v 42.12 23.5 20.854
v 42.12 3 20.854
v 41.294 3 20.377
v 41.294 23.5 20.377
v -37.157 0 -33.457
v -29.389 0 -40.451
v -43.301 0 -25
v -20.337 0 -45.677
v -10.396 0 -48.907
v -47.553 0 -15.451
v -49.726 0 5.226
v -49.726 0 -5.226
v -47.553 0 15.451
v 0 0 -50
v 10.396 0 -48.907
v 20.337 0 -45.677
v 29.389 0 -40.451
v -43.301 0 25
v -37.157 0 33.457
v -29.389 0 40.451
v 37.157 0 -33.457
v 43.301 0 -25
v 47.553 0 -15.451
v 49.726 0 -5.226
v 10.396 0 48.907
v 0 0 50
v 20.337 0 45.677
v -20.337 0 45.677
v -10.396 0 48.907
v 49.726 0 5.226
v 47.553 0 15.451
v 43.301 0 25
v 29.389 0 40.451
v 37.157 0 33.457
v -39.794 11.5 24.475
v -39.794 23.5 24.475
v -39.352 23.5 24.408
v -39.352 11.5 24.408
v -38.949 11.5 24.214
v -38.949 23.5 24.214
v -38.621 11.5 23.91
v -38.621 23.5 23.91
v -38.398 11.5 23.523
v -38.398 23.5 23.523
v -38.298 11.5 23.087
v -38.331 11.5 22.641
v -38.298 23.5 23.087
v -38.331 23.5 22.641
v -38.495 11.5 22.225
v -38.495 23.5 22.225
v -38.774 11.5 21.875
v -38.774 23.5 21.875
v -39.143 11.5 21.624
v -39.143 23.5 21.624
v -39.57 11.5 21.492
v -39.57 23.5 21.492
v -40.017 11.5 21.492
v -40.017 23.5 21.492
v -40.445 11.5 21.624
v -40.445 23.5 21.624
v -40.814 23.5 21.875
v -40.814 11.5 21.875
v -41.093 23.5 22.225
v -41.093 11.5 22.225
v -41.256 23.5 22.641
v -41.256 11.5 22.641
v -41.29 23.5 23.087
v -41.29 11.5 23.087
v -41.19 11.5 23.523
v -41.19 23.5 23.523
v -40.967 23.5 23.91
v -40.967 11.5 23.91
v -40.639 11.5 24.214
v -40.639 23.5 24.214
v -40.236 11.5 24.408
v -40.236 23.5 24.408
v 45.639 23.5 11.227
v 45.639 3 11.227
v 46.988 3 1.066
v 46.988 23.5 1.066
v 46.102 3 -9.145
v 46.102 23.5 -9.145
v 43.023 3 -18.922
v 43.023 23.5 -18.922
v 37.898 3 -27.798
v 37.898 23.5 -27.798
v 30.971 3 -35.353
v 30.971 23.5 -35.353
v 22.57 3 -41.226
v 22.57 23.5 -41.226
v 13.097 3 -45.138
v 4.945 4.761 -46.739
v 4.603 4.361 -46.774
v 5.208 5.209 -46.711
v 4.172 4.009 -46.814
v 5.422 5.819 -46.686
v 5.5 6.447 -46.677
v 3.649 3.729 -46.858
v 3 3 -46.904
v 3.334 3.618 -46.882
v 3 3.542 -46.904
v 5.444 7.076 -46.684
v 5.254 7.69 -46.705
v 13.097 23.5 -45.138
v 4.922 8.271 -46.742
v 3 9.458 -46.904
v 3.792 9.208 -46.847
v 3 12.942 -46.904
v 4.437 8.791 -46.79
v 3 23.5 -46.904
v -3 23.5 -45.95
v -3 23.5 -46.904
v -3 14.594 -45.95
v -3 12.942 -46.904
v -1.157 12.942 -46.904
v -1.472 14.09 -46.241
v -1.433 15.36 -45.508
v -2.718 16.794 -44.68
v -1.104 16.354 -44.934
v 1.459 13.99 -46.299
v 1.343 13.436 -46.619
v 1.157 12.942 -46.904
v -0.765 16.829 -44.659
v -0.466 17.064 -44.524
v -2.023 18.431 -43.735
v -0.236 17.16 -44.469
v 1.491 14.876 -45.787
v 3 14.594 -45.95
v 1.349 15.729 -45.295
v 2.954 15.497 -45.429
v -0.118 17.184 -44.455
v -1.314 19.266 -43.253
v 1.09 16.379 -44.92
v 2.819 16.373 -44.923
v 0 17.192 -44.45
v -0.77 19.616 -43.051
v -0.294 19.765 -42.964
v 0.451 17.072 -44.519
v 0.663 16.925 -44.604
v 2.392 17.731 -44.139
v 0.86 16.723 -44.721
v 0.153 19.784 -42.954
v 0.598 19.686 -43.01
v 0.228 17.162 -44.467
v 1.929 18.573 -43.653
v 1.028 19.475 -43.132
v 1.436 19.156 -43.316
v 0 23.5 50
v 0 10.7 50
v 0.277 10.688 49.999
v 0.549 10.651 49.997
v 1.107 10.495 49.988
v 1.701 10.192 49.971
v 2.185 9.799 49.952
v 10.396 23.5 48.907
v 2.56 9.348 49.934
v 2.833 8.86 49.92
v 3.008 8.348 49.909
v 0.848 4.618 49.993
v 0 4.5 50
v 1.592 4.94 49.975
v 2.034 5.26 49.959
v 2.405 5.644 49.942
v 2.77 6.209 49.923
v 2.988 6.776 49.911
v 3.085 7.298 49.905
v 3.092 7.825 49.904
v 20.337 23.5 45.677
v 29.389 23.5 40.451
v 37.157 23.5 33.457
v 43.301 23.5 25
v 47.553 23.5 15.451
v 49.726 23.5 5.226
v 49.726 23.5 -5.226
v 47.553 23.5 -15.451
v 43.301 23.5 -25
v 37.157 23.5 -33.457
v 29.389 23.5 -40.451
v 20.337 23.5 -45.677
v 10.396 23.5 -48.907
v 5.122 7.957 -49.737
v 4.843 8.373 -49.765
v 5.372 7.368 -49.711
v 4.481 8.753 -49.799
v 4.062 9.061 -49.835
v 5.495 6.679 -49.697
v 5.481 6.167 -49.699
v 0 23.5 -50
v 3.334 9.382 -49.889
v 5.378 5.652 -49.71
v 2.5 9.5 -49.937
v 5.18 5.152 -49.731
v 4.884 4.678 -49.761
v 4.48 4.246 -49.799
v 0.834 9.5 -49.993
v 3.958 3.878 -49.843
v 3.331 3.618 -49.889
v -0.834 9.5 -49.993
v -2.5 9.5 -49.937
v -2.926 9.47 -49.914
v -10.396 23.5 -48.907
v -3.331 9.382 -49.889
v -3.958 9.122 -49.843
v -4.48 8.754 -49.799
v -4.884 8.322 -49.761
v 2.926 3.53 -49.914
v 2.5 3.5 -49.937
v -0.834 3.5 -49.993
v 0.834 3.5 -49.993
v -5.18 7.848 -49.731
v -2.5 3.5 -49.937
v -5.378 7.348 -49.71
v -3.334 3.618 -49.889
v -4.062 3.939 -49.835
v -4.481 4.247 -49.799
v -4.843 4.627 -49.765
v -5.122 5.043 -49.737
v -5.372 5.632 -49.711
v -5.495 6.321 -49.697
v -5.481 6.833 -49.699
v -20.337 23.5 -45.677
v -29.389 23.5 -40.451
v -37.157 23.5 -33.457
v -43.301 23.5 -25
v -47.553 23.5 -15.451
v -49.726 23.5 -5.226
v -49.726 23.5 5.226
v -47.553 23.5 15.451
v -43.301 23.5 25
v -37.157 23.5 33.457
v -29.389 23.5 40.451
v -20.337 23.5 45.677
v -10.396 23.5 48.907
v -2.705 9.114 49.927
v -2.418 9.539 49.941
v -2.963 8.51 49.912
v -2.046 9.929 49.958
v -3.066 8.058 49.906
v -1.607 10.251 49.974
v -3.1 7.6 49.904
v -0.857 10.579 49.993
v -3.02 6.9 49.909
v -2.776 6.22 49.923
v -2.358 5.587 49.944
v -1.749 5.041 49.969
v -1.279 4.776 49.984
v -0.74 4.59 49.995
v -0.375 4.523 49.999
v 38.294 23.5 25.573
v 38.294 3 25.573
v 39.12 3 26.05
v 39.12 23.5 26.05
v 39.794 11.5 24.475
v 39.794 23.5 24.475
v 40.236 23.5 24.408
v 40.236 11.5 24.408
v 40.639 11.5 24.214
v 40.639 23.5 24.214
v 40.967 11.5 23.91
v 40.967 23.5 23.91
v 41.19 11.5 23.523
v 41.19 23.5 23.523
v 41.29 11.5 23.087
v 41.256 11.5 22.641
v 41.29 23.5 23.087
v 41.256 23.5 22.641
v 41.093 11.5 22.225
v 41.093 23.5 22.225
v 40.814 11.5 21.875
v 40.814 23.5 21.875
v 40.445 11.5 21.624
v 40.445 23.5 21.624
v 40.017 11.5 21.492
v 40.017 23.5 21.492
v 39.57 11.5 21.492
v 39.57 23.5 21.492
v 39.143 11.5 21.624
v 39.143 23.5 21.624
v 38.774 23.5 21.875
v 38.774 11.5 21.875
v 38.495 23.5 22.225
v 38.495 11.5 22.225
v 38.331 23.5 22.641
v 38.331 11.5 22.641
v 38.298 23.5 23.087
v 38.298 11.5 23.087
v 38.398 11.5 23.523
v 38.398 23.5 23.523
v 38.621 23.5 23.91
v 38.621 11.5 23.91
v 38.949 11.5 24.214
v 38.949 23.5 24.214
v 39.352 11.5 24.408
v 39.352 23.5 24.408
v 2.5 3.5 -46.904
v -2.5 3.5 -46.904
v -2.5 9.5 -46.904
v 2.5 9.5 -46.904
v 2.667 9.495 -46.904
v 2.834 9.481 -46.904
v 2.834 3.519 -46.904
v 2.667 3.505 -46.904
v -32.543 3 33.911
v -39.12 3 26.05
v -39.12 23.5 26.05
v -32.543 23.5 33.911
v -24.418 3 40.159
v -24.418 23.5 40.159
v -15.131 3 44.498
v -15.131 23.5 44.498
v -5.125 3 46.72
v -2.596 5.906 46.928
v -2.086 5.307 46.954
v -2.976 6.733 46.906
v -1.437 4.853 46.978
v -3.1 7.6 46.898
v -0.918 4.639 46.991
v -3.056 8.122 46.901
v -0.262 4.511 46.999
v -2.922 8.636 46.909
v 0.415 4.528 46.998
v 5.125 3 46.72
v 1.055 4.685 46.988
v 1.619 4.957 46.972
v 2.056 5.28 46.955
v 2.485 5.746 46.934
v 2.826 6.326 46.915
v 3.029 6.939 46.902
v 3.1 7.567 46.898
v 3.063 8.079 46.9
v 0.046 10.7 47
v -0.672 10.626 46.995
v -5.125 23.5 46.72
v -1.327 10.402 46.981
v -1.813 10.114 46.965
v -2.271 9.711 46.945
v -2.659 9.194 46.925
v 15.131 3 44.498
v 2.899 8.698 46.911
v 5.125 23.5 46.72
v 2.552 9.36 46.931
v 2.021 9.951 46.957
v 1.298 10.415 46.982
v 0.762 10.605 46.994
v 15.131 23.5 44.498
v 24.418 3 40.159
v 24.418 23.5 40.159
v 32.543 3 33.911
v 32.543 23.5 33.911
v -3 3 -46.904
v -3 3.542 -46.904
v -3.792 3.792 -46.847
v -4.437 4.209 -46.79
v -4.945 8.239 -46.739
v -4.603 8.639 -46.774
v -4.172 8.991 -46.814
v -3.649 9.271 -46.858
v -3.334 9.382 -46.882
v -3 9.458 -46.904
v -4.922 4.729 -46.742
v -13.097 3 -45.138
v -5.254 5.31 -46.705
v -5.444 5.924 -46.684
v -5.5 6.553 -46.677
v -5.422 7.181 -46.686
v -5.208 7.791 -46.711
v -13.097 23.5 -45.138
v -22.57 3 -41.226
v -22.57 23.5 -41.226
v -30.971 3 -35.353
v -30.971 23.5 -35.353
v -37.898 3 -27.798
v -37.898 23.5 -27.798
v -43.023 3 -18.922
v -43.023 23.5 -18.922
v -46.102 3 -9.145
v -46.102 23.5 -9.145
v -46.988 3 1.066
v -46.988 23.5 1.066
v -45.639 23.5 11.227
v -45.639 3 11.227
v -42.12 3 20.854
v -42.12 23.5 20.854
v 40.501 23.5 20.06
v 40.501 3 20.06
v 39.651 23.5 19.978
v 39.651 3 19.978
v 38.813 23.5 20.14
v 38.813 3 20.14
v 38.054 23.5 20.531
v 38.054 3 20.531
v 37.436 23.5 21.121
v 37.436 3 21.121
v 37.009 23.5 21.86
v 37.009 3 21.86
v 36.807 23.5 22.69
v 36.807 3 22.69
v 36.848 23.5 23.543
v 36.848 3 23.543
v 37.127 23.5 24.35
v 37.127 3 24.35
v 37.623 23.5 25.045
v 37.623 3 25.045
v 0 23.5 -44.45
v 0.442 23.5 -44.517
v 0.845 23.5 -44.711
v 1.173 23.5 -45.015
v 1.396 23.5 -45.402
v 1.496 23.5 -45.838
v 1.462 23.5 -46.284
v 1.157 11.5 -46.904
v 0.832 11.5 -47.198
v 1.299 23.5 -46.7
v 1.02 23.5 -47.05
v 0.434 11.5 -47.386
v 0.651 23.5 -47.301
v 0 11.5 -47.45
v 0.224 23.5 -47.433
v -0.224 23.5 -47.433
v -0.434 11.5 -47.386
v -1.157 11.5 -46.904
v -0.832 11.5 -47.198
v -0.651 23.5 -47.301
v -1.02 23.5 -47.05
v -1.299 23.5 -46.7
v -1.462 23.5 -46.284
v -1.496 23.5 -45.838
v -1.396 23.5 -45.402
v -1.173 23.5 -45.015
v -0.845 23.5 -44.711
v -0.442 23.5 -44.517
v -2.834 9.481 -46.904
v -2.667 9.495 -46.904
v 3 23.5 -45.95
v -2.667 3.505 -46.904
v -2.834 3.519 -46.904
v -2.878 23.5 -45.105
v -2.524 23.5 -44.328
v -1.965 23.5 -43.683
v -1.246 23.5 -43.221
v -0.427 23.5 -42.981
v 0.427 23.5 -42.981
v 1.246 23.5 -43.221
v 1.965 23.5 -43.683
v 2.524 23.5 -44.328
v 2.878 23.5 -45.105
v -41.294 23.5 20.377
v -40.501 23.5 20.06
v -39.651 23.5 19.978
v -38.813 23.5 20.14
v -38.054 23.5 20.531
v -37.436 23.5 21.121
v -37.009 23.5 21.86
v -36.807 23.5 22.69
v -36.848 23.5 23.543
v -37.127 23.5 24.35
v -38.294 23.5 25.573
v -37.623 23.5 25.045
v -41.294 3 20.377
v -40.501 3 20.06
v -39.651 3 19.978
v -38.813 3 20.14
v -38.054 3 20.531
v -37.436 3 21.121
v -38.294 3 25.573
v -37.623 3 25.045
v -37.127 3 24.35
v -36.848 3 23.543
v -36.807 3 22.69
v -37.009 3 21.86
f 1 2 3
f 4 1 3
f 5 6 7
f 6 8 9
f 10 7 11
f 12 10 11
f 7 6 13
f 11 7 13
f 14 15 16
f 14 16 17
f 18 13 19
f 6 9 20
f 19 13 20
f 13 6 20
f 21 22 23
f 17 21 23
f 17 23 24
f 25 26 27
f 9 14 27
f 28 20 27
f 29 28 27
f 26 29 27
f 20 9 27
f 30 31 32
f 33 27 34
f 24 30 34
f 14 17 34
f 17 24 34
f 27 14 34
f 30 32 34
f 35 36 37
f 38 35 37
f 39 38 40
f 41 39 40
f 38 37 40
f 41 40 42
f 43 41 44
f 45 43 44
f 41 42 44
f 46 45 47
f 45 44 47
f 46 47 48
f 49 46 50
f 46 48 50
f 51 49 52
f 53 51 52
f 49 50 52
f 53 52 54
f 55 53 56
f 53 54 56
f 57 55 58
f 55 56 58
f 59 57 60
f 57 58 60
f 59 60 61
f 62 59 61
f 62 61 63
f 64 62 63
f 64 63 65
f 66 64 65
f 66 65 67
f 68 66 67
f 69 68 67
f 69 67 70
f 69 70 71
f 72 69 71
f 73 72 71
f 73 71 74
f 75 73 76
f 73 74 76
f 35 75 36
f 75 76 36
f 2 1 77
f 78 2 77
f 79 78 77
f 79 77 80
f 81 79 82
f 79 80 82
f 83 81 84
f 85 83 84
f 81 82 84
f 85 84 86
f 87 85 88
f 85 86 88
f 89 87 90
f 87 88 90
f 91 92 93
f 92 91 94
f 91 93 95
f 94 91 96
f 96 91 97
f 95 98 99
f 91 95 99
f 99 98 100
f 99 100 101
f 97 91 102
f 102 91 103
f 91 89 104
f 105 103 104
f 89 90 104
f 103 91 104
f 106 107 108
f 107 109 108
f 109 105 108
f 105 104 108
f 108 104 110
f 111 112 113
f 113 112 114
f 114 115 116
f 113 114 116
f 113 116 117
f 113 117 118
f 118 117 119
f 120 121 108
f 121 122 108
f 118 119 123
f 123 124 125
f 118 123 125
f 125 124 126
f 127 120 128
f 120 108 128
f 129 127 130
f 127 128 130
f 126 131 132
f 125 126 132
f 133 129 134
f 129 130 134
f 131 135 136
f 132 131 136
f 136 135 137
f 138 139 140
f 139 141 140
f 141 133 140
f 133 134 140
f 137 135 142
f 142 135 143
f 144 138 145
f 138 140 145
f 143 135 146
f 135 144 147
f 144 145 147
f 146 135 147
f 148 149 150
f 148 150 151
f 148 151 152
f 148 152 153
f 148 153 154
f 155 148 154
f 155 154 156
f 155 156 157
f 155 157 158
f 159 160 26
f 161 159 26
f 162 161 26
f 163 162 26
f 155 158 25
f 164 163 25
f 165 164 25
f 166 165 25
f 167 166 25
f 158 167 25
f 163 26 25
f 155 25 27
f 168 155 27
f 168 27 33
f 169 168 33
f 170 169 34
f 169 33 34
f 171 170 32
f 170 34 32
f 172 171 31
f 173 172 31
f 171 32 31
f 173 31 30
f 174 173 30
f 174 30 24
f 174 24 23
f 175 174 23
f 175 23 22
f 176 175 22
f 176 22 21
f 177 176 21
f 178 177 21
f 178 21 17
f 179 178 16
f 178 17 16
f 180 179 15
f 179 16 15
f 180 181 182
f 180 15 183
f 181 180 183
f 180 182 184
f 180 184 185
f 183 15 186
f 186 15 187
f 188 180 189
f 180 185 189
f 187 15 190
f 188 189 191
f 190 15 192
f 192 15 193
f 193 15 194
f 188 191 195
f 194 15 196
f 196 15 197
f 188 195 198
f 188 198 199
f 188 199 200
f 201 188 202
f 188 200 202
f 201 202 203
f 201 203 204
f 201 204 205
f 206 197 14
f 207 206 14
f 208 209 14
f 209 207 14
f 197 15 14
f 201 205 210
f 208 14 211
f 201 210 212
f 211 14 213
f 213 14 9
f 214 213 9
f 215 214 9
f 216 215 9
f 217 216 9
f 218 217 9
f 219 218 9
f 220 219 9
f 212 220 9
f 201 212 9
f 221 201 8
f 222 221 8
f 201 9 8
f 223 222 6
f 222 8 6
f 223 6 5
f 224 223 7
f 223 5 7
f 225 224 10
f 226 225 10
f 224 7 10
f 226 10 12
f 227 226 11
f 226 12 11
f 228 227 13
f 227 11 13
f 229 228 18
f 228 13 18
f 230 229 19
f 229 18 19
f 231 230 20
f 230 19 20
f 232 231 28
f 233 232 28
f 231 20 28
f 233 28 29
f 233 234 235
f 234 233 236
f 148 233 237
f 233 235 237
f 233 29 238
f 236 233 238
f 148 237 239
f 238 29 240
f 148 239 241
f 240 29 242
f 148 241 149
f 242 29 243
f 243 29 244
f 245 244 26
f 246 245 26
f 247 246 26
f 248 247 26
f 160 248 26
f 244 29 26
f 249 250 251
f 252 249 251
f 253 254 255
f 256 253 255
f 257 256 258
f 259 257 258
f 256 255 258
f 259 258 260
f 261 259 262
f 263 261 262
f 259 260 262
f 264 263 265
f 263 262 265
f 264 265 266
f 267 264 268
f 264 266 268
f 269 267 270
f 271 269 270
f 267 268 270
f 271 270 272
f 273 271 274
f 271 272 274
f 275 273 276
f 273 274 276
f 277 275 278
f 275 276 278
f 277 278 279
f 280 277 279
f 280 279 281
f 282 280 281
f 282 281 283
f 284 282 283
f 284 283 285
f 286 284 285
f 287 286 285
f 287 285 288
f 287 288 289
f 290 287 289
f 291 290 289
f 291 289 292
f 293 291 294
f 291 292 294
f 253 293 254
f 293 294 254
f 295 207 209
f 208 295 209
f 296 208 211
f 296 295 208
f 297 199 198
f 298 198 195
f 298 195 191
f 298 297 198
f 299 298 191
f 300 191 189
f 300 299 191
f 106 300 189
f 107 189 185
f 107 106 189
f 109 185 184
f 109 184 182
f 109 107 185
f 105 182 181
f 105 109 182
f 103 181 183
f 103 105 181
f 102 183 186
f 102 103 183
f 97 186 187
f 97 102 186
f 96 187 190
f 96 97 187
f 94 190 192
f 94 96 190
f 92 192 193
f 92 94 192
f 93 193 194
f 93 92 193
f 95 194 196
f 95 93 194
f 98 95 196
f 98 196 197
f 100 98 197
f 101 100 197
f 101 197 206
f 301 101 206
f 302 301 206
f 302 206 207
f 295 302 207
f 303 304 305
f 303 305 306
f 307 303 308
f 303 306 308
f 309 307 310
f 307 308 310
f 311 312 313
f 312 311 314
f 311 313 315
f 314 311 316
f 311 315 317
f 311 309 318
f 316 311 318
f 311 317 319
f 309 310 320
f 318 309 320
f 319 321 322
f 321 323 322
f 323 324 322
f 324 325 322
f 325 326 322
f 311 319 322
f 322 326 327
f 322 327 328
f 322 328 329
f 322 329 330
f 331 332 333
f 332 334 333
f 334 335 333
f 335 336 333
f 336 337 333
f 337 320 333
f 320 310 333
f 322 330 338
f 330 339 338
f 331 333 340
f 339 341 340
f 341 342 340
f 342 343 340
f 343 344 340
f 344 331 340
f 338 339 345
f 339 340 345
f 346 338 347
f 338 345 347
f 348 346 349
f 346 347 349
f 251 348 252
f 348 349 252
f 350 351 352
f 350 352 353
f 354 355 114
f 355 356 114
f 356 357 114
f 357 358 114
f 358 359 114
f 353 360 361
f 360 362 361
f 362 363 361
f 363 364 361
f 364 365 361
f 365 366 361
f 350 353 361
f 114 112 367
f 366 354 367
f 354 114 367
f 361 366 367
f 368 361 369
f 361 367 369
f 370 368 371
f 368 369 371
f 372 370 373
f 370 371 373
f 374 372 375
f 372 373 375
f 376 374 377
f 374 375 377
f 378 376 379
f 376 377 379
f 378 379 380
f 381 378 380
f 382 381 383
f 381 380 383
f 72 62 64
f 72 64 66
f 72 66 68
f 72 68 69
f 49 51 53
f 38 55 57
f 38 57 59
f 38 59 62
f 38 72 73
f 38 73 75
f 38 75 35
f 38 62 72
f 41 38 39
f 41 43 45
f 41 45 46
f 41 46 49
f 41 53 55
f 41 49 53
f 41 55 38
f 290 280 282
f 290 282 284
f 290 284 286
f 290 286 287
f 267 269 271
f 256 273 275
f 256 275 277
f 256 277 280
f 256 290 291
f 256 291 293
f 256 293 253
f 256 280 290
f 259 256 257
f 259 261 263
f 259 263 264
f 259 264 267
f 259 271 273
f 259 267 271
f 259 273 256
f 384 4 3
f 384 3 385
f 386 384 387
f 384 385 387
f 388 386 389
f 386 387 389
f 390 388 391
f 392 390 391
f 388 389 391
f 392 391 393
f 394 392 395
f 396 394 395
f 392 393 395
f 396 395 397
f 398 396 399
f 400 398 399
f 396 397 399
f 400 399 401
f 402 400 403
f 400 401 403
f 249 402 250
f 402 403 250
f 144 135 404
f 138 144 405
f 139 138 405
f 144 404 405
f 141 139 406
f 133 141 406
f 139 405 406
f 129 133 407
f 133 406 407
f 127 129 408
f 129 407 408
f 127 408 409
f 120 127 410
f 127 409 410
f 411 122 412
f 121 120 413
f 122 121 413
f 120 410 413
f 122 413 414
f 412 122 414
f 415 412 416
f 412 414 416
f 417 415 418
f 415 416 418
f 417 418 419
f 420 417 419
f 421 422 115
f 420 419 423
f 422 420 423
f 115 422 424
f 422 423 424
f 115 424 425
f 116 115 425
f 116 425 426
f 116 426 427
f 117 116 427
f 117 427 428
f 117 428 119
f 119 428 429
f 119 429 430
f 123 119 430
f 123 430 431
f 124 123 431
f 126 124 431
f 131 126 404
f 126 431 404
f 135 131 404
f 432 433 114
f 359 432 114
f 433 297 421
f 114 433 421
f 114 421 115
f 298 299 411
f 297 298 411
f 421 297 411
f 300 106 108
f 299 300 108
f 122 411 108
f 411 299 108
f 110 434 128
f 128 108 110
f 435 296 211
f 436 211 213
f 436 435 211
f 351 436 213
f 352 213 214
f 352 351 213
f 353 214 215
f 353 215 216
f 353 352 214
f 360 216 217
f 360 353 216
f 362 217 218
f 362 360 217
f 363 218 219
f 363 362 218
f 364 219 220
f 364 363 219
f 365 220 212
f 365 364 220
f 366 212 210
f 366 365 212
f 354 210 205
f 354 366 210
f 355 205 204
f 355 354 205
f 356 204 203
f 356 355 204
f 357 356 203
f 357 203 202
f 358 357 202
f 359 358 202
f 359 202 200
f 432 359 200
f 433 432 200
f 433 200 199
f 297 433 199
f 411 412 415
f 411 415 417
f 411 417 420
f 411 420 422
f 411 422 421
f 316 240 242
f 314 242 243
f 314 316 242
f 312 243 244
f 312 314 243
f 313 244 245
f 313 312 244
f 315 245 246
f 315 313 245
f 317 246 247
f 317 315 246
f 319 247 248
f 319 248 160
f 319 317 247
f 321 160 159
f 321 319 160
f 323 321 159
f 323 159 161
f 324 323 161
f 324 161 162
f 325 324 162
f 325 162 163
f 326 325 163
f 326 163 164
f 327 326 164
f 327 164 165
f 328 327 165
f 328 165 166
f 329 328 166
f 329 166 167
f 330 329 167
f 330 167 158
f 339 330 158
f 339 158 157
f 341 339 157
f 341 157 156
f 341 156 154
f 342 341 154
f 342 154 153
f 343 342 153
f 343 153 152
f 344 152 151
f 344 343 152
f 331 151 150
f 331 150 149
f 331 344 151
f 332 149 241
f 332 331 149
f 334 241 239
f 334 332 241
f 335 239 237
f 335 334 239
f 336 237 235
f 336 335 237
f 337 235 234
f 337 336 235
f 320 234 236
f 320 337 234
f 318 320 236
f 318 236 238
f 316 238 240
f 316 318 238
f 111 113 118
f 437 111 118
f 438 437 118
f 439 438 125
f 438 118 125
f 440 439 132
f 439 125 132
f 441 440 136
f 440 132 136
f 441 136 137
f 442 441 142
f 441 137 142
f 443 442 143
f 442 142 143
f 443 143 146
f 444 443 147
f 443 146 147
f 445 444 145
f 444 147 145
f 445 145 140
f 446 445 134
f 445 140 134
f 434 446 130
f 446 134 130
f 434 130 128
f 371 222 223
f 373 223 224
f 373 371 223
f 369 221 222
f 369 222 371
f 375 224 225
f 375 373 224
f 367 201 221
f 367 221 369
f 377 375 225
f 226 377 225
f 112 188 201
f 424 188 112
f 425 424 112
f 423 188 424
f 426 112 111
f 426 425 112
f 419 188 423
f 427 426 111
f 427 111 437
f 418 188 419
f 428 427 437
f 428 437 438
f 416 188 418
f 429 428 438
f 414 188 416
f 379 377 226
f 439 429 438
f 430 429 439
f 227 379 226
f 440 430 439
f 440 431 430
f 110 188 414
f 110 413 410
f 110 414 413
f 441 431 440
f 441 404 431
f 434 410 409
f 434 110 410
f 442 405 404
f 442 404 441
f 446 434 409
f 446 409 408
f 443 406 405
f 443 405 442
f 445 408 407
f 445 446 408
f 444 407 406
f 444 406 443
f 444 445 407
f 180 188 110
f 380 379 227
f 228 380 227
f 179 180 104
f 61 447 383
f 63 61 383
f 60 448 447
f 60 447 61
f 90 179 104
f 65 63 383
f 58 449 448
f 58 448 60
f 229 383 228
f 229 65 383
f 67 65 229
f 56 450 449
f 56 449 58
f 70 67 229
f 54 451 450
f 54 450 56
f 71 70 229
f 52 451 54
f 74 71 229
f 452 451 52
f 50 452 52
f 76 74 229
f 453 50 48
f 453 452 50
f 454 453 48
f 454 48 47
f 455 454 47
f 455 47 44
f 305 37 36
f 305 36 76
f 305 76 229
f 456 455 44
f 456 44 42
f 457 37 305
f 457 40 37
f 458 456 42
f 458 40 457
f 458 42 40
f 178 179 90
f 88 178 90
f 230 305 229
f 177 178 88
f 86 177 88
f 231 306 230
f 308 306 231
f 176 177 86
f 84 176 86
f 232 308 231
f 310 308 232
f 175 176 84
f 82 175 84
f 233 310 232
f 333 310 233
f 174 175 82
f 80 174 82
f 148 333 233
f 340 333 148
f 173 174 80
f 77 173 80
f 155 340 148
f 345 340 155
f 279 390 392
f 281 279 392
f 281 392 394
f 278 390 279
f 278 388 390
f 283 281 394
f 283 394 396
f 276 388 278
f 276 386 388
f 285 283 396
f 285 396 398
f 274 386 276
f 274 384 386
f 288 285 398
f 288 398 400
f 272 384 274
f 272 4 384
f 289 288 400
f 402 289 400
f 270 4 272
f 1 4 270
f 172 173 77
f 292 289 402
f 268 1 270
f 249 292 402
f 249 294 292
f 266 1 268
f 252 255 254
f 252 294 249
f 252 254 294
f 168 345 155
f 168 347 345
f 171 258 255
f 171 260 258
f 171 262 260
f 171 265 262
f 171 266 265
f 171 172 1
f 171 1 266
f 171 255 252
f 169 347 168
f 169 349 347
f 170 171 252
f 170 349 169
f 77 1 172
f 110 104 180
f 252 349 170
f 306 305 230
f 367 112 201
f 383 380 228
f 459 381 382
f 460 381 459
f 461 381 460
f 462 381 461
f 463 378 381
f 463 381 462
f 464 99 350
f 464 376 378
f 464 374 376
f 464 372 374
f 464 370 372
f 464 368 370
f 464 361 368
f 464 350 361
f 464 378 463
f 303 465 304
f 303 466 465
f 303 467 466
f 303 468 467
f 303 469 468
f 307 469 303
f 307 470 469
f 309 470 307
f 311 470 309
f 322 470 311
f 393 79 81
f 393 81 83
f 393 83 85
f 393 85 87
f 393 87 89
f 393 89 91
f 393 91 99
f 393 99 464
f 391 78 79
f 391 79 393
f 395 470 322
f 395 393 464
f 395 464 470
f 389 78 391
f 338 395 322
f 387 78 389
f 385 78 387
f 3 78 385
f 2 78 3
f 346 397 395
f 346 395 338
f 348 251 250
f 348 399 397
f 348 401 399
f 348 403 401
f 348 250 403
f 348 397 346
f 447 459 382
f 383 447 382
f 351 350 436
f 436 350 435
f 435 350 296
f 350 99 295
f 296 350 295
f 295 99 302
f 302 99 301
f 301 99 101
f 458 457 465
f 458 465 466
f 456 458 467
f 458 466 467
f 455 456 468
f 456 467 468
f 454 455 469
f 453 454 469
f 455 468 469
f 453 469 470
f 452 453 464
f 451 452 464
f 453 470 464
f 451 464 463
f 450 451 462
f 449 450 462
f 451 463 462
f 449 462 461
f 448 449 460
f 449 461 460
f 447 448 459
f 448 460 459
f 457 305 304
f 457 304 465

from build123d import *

# Parameters (mm, degrees)
SKETCH2_R               = 50
BOSS_EXTRUDE1_DEPTH     = 23.5
SKETCH3_R               = 47
CUT_EXTRUDE1_DEPTH      = 20.5
BOSS_EXTRUDE2_DEPTH     = 20.5
SKETCH7_R               = 1.5
CUT_EXTRUDE3_DEPTH      = 12
SKETCH8_R               = 3.1
CUT_EXTRUDE4_DEPTH      = 75.51342161
CUT_EXTRUDE5_REACH      = 78.559
CUT_EXTRUDE5_END_RADIUS = 47
CUT_EXTRUDE6_DEPTH      = 75.513421776


with BuildPart() as part:
    # Sketch2 → Boss-Extrude1 (new body)
    with BuildSketch(Plane(origin=(0, 0, 0), x_dir=(1, 0, 0), z_dir=(0, 1, 0))):
        with Locations(Location((0, 0, 0), (0, 0, 270))):
            Circle(SKETCH2_R)
    extrude(amount=BOSS_EXTRUDE1_DEPTH)

    # Sketch3 → Cut-Extrude1 (cut)
    with BuildSketch(Plane(origin=(0, 23.5, 0), x_dir=(1, 0, 0), z_dir=(0, 1, 0))):
        with Locations(Location((0, 0, 0), (0, 0, 270))):
            Circle(SKETCH3_R)
    extrude(amount=-CUT_EXTRUDE1_DEPTH, mode=Mode.SUBTRACT)

    # Sketch4 → Boss-Extrude2 (add)
    with BuildSketch(Plane(origin=(0, 3, 0), x_dir=(1, 0, 0), z_dir=(0, 1, 0))):
        with BuildLine():
            Line((3, 48.95), (-3, 48.95))
            Line((-3, 48.95), (-3, 45.95))
            ThreePointArc((-3, 45.95), (0, 42.95), (3, 45.95))
            Line((3, 45.95), (3, 48.95))
        make_face()
        with BuildLine():
            Line((43.891943515, -21.876923789), (41.293867304, -20.376923789))
            ThreePointArc((41.293867304, -20.376923789), (37.195791093, -21.475), (38.293867304, -25.573076211))
            Line((38.293867304, -25.573076211), (40.891943515, -27.073076211))
            Line((40.891943515, -27.073076211), (43.891943515, -21.876923789))
        make_face()
        with BuildLine():
            Line((-40.891943515, -27.073076211), (-38.293867304, -25.573076211))
            ThreePointArc((-38.293867304, -25.573076211), (-37.195791093, -21.475), (-41.293867304, -20.376923789))
            Line((-41.293867304, -20.376923789), (-43.891943515, -21.876923789))
            Line((-43.891943515, -21.876923789), (-40.891943515, -27.073076211))
        make_face()
    extrude(amount=BOSS_EXTRUDE2_DEPTH)

    # Sketch7 → Cut-Extrude3 (cut)
    with BuildSketch(Plane(origin=(0, 23.5, 0), x_dir=(1, 0, 0), z_dir=(0, 1, 0))):
        with Locations(Location((0, 45.95, 0), (0, 0, 270))):
            Circle(SKETCH7_R)
        with Locations(Location((39.793867304, -22.975, 0), (0, 0, 270))):
            Circle(SKETCH7_R)
        with Locations(Location((-39.793867304, -22.975, 0), (0, 0, 270))):
            Circle(SKETCH7_R)
    extrude(amount=-CUT_EXTRUDE3_DEPTH, mode=Mode.SUBTRACT)

    # Sketch8 → Cut-Extrude4 (cut, through all)
    with BuildSketch(Plane.XY):
        with Locations(Location((0, 7.6, 0), (0, 0, 180))):
            Circle(SKETCH8_R)
    extrude(amount=CUT_EXTRUDE4_DEPTH, mode=Mode.SUBTRACT)

    # Cut-Extrude5: up to this cylinder (the profile starts inside it)
    cut_extrude5_end = Plane(origin=(0, 10.013188, 0), z_dir=(0, 1, 0)) * Cylinder(CUT_EXTRUDE5_END_RADIUS, 252.118, mode=Mode.PRIVATE)
    # Sketch9 → Cut-Extrude5 (cut, up to the surface)
    with BuildSketch(Plane(origin=(3, 0, 0), x_dir=(0, 0, -1), z_dir=(1, 0, 0)), mode=Mode.PRIVATE) as cut_extrude5_sk1:
        Polygon((46.904157598, 12.941577654), (42.581578264, 20.428504681), (42.581578264, 3), (46.904157598, 3), align=None)
    cut_extrude5_tool1 = extrude(cut_extrude5_sk1.sketch, amount=-CUT_EXTRUDE5_REACH, mode=Mode.PRIVATE) & cut_extrude5_end
    add(cut_extrude5_tool1.solids().sort_by_distance((3, 10.013188, -44.545799))[0], mode=Mode.SUBTRACT)

    # Sketch11 → Cut-Extrude6 (cut, through all)
    with BuildSketch(Plane.XY):
        with BuildLine():
            Line((-2.5, 9.5), (2.5, 9.5))
            ThreePointArc((2.5, 9.5), (5.5, 6.5), (2.5, 3.5))
            Line((2.5, 3.5), (-2.5, 3.5))
            ThreePointArc((-2.5, 3.5), (-5.5, 6.5), (-2.5, 9.5))
        make_face()
    extrude(amount=-CUT_EXTRUDE6_DEPTH, mode=Mode.SUBTRACT)


solid = part.part
